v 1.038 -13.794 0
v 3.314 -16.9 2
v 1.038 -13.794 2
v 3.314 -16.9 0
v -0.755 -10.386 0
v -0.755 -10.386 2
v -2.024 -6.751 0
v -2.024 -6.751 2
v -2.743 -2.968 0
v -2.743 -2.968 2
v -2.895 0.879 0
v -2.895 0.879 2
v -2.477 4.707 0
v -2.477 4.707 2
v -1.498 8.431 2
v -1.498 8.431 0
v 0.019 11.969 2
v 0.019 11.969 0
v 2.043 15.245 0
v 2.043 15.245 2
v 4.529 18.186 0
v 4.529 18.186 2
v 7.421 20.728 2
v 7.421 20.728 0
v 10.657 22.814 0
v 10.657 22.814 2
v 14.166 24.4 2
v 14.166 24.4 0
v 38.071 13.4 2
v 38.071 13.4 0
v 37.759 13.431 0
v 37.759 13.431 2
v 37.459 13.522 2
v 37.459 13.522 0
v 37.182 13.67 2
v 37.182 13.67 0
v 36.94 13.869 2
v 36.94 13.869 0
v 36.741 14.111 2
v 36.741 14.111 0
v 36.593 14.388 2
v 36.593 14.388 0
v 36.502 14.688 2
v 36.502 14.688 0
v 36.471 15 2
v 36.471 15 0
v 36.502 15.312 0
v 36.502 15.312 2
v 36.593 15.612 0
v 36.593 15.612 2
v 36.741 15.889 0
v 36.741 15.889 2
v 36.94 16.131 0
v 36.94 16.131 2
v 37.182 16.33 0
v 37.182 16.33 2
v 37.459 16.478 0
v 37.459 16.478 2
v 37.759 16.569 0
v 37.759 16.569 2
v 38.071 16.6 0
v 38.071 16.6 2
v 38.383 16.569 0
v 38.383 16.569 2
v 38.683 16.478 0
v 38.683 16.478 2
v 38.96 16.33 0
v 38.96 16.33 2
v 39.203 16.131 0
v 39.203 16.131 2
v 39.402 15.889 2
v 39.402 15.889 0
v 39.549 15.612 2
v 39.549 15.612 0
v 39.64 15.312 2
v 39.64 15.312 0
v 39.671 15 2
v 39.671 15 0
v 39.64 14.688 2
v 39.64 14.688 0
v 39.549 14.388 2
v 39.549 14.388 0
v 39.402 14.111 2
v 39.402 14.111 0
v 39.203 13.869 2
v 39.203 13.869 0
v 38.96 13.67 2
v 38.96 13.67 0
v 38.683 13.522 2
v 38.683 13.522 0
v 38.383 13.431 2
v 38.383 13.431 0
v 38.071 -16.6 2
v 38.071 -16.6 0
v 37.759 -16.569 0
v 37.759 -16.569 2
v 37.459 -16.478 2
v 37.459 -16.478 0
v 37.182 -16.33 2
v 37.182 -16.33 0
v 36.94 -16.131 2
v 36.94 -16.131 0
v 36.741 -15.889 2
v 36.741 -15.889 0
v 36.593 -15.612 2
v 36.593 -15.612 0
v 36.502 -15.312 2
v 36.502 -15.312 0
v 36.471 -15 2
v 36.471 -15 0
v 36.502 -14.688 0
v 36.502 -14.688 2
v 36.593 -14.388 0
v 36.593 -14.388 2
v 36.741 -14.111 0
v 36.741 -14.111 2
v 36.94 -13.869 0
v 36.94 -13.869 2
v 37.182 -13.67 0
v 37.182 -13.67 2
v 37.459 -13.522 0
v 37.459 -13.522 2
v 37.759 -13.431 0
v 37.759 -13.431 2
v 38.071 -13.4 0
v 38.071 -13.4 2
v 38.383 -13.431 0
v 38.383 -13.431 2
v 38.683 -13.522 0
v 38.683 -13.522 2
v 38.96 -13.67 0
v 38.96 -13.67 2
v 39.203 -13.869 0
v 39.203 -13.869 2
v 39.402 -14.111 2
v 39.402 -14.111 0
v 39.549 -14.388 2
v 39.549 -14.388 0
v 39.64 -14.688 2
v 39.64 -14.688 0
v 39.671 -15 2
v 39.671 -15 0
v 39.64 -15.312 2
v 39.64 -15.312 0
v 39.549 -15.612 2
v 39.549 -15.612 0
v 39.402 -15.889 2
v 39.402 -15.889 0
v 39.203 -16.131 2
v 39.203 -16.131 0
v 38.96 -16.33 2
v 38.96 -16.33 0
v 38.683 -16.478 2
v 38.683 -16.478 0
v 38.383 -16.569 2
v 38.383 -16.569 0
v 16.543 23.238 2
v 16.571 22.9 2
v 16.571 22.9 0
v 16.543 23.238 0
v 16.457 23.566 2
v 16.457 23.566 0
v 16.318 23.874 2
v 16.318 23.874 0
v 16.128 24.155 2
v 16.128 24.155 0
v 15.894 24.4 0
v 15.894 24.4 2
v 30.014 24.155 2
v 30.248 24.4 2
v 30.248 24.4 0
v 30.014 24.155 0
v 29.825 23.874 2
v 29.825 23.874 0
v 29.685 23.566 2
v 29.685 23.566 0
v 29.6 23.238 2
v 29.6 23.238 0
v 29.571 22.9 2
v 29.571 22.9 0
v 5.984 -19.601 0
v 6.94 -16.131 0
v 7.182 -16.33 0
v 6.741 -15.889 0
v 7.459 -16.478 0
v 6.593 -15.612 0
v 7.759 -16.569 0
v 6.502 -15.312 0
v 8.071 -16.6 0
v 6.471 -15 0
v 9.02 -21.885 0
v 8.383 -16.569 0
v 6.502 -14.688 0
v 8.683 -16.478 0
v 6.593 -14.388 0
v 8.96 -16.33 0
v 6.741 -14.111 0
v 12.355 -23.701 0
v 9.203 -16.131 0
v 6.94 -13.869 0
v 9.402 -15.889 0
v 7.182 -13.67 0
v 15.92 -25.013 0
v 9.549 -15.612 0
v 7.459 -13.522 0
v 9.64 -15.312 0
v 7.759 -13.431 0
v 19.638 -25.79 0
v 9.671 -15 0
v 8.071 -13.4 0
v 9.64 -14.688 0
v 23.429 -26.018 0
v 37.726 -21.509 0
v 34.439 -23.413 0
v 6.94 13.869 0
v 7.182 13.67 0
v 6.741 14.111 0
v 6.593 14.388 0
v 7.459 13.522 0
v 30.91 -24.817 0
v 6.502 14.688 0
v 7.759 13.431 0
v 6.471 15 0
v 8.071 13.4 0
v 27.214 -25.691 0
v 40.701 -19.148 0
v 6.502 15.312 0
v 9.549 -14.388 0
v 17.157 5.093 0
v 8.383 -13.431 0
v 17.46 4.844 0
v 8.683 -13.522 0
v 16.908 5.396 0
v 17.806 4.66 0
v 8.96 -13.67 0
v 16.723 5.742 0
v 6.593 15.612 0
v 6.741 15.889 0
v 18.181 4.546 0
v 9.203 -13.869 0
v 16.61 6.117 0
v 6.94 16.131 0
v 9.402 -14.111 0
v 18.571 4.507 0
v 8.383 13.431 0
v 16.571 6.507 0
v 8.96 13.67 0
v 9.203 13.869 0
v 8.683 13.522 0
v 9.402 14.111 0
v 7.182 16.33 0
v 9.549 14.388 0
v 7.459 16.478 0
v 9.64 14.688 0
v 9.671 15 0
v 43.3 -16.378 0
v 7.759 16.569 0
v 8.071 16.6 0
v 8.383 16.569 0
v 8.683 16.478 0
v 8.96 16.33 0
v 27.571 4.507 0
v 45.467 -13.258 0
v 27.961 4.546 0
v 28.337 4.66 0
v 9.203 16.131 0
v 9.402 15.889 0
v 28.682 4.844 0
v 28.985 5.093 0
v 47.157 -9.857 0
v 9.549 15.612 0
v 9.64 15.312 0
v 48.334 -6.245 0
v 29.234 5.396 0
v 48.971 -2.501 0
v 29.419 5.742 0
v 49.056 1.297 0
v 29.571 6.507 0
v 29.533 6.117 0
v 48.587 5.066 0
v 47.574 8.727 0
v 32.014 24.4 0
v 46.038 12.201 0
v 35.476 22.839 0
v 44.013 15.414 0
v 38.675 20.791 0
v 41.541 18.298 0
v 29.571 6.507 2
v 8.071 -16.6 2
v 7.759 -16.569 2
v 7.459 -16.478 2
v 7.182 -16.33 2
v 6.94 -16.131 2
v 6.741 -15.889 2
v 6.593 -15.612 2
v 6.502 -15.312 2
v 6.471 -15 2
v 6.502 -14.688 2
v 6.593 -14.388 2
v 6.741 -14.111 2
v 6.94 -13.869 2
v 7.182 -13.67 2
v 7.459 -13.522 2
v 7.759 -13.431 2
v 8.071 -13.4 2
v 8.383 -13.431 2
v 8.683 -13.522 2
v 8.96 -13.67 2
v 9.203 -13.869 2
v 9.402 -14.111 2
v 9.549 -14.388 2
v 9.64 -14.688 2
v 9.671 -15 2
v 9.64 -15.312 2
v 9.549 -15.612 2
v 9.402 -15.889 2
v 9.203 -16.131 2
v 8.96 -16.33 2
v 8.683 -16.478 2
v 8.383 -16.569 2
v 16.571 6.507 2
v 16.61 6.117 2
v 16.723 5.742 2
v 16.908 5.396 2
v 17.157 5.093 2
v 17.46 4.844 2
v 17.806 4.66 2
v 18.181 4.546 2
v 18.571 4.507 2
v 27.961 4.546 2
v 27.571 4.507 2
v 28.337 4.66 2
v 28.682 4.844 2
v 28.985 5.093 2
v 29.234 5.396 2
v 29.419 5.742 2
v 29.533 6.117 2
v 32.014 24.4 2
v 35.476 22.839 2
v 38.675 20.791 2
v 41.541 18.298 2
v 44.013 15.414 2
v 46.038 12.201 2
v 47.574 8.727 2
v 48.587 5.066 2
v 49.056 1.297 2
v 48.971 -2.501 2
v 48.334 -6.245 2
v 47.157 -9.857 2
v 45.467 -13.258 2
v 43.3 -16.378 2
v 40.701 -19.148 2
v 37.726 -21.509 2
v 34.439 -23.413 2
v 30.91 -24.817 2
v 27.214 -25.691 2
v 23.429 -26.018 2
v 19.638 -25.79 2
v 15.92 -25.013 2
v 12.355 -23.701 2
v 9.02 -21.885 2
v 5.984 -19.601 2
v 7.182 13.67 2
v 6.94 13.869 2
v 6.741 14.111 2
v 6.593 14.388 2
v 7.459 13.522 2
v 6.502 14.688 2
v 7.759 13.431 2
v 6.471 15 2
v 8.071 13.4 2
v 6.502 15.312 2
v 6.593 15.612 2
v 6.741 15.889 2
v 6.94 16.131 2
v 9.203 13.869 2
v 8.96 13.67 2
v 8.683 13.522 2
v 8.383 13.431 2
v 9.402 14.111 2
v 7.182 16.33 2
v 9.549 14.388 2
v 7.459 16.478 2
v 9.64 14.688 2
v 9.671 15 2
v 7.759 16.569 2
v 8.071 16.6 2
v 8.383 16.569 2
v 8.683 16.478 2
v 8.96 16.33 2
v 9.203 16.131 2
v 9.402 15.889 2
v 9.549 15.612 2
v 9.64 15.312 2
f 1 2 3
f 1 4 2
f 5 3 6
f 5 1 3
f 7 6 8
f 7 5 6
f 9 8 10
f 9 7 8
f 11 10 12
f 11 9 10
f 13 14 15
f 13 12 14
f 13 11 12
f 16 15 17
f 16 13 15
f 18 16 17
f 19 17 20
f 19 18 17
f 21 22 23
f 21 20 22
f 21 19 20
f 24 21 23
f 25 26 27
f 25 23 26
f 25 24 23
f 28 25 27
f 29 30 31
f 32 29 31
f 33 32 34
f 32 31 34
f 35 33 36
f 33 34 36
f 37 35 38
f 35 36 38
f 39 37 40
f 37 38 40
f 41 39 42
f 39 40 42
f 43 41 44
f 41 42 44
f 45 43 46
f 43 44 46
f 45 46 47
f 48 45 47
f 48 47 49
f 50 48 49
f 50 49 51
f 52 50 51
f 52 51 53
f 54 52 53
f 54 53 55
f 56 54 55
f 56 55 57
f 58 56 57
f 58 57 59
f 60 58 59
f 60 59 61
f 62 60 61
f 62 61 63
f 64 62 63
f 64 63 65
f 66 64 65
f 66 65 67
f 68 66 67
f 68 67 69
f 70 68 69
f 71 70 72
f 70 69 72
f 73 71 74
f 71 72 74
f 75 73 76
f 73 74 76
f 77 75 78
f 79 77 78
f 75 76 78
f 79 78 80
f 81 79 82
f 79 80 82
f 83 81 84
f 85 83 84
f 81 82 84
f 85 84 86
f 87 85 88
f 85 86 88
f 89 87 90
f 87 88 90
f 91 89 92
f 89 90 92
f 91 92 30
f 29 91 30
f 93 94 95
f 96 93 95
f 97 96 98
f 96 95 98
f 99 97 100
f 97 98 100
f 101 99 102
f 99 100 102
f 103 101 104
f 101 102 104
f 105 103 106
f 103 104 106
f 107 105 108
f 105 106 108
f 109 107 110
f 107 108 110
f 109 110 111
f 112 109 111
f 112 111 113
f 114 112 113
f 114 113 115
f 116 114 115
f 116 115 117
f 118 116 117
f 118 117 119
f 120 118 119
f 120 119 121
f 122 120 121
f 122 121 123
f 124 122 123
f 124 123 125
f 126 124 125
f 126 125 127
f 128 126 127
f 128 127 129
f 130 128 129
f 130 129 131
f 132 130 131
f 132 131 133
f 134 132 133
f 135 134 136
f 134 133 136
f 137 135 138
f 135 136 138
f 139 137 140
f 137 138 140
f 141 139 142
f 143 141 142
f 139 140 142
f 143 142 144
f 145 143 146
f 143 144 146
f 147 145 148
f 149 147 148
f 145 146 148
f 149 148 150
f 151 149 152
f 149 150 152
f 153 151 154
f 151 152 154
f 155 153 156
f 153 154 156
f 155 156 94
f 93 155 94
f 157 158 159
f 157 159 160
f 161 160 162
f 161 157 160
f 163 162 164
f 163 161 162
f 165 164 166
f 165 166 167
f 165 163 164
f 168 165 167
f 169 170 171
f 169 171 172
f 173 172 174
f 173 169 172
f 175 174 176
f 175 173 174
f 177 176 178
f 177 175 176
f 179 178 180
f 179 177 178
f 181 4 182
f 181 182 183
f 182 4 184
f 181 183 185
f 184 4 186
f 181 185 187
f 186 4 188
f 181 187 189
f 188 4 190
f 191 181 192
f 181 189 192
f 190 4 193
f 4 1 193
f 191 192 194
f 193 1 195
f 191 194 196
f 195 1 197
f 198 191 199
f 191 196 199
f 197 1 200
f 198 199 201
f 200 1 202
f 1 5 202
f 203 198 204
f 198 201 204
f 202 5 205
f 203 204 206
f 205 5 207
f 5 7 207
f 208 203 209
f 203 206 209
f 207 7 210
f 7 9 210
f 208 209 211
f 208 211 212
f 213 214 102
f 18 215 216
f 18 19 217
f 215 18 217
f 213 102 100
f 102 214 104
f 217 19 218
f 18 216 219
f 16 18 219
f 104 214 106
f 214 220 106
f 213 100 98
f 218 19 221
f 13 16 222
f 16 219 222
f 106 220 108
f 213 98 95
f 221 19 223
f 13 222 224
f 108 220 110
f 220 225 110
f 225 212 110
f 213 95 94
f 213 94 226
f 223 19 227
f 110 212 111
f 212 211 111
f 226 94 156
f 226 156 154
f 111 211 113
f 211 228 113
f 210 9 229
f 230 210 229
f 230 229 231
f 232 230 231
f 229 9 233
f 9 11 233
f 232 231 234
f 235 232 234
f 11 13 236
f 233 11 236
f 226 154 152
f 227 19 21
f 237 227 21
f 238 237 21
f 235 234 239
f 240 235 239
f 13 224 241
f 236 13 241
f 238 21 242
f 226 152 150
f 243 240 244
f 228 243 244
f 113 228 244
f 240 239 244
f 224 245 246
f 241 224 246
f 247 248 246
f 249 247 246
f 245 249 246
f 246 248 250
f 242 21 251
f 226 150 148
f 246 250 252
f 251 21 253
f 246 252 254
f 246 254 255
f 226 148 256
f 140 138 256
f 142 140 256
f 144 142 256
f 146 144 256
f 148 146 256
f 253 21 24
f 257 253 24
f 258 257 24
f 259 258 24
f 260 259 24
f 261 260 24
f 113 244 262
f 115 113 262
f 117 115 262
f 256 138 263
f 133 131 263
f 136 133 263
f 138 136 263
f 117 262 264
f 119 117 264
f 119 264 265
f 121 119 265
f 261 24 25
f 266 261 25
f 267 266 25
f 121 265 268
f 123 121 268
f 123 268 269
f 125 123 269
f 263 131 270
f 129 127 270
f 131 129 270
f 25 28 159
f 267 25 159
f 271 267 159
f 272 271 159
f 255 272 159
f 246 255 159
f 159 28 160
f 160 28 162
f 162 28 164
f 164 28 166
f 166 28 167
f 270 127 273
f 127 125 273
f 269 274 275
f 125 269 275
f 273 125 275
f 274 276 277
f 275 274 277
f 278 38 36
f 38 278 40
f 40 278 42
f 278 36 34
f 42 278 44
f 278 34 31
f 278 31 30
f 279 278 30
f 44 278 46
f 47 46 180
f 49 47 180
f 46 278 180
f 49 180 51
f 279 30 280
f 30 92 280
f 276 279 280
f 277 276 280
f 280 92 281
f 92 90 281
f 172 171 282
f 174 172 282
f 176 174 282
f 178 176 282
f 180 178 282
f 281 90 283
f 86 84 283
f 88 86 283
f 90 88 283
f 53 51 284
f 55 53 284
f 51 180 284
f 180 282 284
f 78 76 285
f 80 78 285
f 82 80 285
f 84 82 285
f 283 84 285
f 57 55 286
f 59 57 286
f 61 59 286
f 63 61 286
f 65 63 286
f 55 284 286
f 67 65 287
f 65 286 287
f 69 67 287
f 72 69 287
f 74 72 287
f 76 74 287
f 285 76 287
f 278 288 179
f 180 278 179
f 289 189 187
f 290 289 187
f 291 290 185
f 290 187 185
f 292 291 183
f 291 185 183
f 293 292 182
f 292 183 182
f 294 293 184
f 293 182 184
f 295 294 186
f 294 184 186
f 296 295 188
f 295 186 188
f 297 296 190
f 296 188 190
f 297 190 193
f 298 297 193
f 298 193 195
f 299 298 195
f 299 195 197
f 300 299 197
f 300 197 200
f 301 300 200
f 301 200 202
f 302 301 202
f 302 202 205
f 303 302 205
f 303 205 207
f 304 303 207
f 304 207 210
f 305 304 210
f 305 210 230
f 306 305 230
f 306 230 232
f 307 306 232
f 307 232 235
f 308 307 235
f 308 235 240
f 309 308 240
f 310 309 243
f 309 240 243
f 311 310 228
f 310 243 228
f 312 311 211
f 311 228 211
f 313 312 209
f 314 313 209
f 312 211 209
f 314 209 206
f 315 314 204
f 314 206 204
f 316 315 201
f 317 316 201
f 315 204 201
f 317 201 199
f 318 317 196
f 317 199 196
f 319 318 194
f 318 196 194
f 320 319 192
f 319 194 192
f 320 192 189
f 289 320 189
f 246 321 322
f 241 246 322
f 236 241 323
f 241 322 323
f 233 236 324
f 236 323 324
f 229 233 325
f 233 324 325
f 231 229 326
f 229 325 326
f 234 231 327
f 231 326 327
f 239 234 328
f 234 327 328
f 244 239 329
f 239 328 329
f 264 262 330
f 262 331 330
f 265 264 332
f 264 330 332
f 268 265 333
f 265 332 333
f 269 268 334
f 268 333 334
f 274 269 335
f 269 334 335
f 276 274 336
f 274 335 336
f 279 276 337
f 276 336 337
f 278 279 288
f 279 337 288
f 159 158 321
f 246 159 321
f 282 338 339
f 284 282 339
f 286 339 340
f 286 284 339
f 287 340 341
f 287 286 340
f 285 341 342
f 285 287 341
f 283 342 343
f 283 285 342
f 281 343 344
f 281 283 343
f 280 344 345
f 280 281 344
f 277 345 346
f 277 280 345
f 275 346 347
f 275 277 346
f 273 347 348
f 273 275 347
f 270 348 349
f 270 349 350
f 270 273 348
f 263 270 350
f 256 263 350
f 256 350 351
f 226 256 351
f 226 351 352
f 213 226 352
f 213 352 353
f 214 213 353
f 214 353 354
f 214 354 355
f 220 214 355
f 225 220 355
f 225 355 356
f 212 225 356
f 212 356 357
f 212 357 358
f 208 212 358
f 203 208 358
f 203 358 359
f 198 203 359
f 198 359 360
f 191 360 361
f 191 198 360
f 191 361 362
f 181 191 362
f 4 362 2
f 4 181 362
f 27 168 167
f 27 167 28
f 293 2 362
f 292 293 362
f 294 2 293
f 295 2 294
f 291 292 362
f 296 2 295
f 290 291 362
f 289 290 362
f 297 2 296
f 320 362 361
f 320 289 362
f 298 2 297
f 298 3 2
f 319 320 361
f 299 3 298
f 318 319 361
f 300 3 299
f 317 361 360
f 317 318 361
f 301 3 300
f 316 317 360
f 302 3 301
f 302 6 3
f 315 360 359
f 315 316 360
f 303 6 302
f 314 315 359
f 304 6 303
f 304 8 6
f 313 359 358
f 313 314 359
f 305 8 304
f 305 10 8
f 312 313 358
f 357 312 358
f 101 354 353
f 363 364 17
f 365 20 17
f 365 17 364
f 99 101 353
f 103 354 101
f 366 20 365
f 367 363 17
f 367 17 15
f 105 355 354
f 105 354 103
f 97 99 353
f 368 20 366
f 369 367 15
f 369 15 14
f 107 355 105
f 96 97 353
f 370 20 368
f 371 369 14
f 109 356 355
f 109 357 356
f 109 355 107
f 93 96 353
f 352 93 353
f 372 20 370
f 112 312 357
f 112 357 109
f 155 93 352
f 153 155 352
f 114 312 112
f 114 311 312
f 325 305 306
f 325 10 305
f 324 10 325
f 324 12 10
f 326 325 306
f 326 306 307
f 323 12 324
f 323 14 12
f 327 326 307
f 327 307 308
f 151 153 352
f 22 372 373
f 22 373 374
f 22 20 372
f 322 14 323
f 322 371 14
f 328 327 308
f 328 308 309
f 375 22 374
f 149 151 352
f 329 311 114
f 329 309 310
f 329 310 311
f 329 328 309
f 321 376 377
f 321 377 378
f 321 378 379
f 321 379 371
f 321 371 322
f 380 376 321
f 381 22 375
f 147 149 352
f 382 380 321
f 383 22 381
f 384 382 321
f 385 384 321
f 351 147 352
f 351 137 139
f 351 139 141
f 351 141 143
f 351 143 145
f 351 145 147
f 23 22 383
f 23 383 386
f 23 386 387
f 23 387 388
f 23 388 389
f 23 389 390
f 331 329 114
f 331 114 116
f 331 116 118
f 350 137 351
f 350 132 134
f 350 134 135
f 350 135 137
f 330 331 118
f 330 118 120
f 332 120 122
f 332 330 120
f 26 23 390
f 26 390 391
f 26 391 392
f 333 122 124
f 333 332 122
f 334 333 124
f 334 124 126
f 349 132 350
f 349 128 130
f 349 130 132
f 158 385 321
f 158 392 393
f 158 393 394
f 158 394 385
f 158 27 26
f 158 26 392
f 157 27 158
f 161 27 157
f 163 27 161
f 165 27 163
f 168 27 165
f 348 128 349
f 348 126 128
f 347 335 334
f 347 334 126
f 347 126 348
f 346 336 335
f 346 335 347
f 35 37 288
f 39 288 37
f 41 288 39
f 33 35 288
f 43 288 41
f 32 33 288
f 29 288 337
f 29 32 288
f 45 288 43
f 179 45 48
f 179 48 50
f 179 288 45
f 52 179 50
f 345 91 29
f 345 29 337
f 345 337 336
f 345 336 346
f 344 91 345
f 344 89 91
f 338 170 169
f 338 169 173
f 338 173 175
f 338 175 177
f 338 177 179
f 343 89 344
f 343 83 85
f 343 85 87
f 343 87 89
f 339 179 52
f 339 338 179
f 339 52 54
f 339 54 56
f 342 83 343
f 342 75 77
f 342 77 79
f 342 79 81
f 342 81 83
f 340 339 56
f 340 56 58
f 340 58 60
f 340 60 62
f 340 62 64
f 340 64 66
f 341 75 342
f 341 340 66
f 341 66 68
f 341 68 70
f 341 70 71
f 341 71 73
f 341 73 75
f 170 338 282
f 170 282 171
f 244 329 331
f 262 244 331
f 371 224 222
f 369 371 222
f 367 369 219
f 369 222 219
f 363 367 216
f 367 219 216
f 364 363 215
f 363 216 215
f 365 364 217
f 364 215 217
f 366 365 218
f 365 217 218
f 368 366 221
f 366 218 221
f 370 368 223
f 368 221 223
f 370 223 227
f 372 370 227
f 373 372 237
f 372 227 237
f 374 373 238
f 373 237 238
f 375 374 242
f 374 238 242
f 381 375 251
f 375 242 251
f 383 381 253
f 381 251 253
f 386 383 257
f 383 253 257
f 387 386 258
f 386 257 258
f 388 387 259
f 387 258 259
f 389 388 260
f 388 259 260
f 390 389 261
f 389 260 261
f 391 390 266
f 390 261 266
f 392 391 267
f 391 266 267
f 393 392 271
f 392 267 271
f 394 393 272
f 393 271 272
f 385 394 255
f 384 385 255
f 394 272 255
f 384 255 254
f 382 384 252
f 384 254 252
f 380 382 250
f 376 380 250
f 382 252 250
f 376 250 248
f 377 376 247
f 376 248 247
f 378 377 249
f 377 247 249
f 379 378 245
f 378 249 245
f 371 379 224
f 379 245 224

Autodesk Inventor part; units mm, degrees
ref_plane "YZ Plane" through (0, 0, 0) normal (1, 0, 0) x (0, 1, 0)
ref_plane "XZ Plane" through (0, 0, 0) normal (0, 1, 0) x (-1, 0, 0)
ref_plane "XY Plane" through (0, 0, 0) normal (0, 0, 1) x (1, 0, 0)
ref_plane "Arbeitsebene1" through (0, 0, 0) normal (0, 0, 1) x (1, 0, 0)
sketch "Skizze1" plane through (0, 0, 0) normal (0, 0, 1) x (1, 0, 0)
  line L0 (8.0712, 15) -> (38.0712, 15)
  line L1 (38.0712, 15) -> (38.0712, -15)
  line L2 (38.0712, -15) -> (8.0712, -15)
  line L3 (8.0712, -15) -> (8.0712, 15)
  line L4 (38.0712, 19) -> (8.0712, 19)
  line L5 (4.0712, 15) -> (4.0712, -15)
  line L6 (8.0712, -19) -> (38.0712, -19)
  line L7 (42.0712, -15) -> (42.0712, 15)
  arc A0 (8.0712, 19) -> (4.0712, 15) centre (8.0712, 15) ccw
  arc A1 (42.0712, 15) -> (38.0712, 19) centre (38.0712, 15) ccw
  arc A2 (38.0712, -19) -> (42.0712, -15) centre (38.0712, -15) ccw
  arc A3 (4.0712, -15) -> (8.0712, -19) centre (8.0712, -15) ccw
  line L8 (29.9712, -18.3074) -> (29.9712, -24.4) projected
  circle A4 centre (38.0712, -15) radius 1.4 projected
  circle A5 centre (38.0712, 15) radius 1.4 projected
  line L9 (39.5712, -24.4) -> (29.9712, -24.4) projected
  line L10 (39.5712, -21.1181) -> (39.5712, -24.4) projected
  line L11 (44.1893, -16.5) -> (39.5712, -21.1181) projected
  line L12 (47.4712, -16.5) -> (44.1893, -16.5) projected
  line L13 (47.4712, 16.5) -> (47.4712, -16.5) projected
  line L14 (44.1893, 16.5) -> (47.4712, 16.5) projected
  line L15 (39.5712, 21.1181) -> (44.1893, 16.5) projected
  line L16 (39.5712, 24.4) -> (39.5712, 21.1181) projected
  line L17 (31.5712, 24.4) -> (39.5712, 24.4) projected
  line L18 (31.5712, 4.0068) -> (31.5712, 24.4) projected
  arc A6 (32.7786, 1.7) -> (31.5712, 4.0068) centre (29.9712, 1.7) ccw projected
  line L19 (32.7786, 1.7) -> (32.7786, -15.5) projected
  arc A7 (29.9712, -18.3074) -> (32.7786, -15.5) centre (29.9712, -15.5) ccw projected
  arc A8 (16.5712, 25.149) -> (3.3138, -16.9) centre (23.0897, -0.0206) ccw
  circle A9 centre (23.0897, -0.0206) radius 26
  point P0 (0, 0)
  point P1 (36.5793, -24.4)
  point P2 (31.5712, 11.3758)
  point P3 (3.3138, -16.9)
  dimension "d0" = 4
  dimension "d1" = 4
extrude "Extrusion1" add sketch "Skizze1" along normal blind 2 contours L3 L2 L19 A7 L8 L6 A3 L5 A0 L4 L18 L0 | L0 L18 A6 L19 L2 L3 | L18 L4 A1 L7 A2 L6 L8 A7 L19 L2 A4 L1 A5 L0 | L0 A5 L1 A4 L2 L19 A6 L18 | A5 L1 L0 | L0 L1 A5 | L18 L17 A9 L13 L9 L8 L6 A2 L7 A1 L4 | L4 A0 L5 A3 L6 L8 L9 A9 A8 L17 L18 | A4 L1 L2 | L2 L1 A4 | A9 L13
ref_plane "Arbeitsebene2" through (0, 0, 0) normal (0, 0, 1) x (1, 0, 0)
sketch "Skizze2" plane through (0, 0, 2) normal (0, 0, 1) x (1, 0, 0)
  arc A0 (8.0712, 19) -> (4.0712, 15) centre (8.0712, 15) ccw projected
  line L0 (4.0712, 15) -> (4.0712, -15) projected
  arc A1 (4.0712, -15) -> (8.0712, -19) centre (8.0712, -15) ccw projected
  line L1 (8.0712, -19) -> (38.0712, -19) projected
  arc A2 (38.0712, -19) -> (42.0712, -15) centre (38.0712, -15) ccw projected
  line L2 (42.0712, -15) -> (42.0712, 15) projected
  arc A3 (42.0712, 15) -> (38.0712, 19) centre (38.0712, 15) ccw projected
  line L3 (38.0712, 19) -> (8.0712, 19) projected
  circle A4 centre (8.0712, 15) radius 1.4 projected
  circle A5 centre (38.0712, 15) radius 1.4 projected
  circle A6 centre (38.0712, -15) radius 1.4 projected
  circle A7 centre (8.0712, -15) radius 1.4 projected
  point P0 (0, 0)
hole "Bohrung1" at (8.0712, 15, 2) at (8.0712, -15, 2) at (38.0712, -15, 2) at (38.0712, 15, 2) direction (0, 0, -1) diameter 3.2 end through all
sketch "Skizze3" plane through (0, 0, 2) normal (0, 0, 1) x (1, 0, 0)
  circle A0 centre (23.0919, -0.0207) radius 4.25 projected
  arc A1 (30.2483, 24.4) -> (29.5712, 22.9) centre (31.5712, 22.9) ccw projected
  line L0 (39.5712, 24.4) -> (30.2483, 24.4) projected
  line L1 (39.5712, 21.1181) -> (39.5712, 24.4) projected
  line L2 (44.1893, 16.5) -> (39.5712, 21.1181) projected
  line L3 (47.4712, 16.5) -> (44.1893, 16.5) projected
  line L4 (47.4712, -16.5) -> (47.4712, 16.5) projected
  line L5 (44.1893, -16.5) -> (47.4712, -16.5) projected
  line L6 (39.5712, -21.1181) -> (44.1893, -16.5) projected
  line L7 (39.5712, -24.4) -> (39.5712, -21.1181) projected
  line L8 (6.6126, -24.4) -> (39.5712, -24.4) projected
  line L9 (6.6126, -21.1595) -> (6.6126, -24.4) projected
  line L10 (1.9531, -16.5) -> (6.6126, -21.1595) projected
  line L11 (-1.3288, -16.5) -> (1.9531, -16.5) projected
  line L12 (-1.3288, 16.5) -> (-1.3288, -16.5) projected
  line L13 (1.9531, 16.5) -> (-1.3288, 16.5) projected
  line L14 (6.5712, 21.1181) -> (1.9531, 16.5) projected
  line L15 (6.5712, 24.4) -> (6.5712, 21.1181) projected
  line L16 (15.894, 24.4) -> (6.5712, 24.4) projected
  arc A2 (16.5712, 22.9) -> (15.894, 24.4) centre (14.5712, 22.9) ccw projected
  line L17 (16.5712, 22.9) -> (16.5712, 6.5074) projected
  arc A3 (16.5712, 6.5074) -> (18.5712, 4.5074) centre (18.5712, 6.5074) ccw projected
  line L18 (18.5712, 4.5074) -> (27.5712, 4.5074) projected
  arc A4 (27.5712, 4.5074) -> (29.5712, 6.5074) centre (27.5712, 6.5074) ccw projected
  line L19 (29.5712, 6.5074) -> (29.5712, 22.9) projected
  circle A5 centre (38.0712, 15) radius 1.4 projected
  circle A6 centre (8.0712, -15) radius 1.4 projected
  circle A7 centre (38.0712, -15) radius 1.4 projected
  circle A8 centre (8.0712, 15) radius 1.4 projected
  line L20 (15.894, 24.4) -> (30.2483, 24.4)
  line L21 (6.5712, 24.4) -> (39.5712, 24.4)
  line L22 (39.5712, 24.4) -> (39.5712, 27.6612)
  line L23 (39.5712, 27.6612) -> (6.5712, 27.6612)
  line L24 (6.5712, 27.6612) -> (6.5712, 24.4)
  point P0 (0, 0)
extrude "Extrusion2" cut sketch "Skizze3" against normal blind 10 contours L20 L16 L24 L23 L22 L0 | A1 L19 A4 L18 A3 L17 A2 L20
fillet "Rundung1" [suppressed]
properties part number "20_Cube_Insert_SEEED_Xiao_Sense_Camera_backplate"
